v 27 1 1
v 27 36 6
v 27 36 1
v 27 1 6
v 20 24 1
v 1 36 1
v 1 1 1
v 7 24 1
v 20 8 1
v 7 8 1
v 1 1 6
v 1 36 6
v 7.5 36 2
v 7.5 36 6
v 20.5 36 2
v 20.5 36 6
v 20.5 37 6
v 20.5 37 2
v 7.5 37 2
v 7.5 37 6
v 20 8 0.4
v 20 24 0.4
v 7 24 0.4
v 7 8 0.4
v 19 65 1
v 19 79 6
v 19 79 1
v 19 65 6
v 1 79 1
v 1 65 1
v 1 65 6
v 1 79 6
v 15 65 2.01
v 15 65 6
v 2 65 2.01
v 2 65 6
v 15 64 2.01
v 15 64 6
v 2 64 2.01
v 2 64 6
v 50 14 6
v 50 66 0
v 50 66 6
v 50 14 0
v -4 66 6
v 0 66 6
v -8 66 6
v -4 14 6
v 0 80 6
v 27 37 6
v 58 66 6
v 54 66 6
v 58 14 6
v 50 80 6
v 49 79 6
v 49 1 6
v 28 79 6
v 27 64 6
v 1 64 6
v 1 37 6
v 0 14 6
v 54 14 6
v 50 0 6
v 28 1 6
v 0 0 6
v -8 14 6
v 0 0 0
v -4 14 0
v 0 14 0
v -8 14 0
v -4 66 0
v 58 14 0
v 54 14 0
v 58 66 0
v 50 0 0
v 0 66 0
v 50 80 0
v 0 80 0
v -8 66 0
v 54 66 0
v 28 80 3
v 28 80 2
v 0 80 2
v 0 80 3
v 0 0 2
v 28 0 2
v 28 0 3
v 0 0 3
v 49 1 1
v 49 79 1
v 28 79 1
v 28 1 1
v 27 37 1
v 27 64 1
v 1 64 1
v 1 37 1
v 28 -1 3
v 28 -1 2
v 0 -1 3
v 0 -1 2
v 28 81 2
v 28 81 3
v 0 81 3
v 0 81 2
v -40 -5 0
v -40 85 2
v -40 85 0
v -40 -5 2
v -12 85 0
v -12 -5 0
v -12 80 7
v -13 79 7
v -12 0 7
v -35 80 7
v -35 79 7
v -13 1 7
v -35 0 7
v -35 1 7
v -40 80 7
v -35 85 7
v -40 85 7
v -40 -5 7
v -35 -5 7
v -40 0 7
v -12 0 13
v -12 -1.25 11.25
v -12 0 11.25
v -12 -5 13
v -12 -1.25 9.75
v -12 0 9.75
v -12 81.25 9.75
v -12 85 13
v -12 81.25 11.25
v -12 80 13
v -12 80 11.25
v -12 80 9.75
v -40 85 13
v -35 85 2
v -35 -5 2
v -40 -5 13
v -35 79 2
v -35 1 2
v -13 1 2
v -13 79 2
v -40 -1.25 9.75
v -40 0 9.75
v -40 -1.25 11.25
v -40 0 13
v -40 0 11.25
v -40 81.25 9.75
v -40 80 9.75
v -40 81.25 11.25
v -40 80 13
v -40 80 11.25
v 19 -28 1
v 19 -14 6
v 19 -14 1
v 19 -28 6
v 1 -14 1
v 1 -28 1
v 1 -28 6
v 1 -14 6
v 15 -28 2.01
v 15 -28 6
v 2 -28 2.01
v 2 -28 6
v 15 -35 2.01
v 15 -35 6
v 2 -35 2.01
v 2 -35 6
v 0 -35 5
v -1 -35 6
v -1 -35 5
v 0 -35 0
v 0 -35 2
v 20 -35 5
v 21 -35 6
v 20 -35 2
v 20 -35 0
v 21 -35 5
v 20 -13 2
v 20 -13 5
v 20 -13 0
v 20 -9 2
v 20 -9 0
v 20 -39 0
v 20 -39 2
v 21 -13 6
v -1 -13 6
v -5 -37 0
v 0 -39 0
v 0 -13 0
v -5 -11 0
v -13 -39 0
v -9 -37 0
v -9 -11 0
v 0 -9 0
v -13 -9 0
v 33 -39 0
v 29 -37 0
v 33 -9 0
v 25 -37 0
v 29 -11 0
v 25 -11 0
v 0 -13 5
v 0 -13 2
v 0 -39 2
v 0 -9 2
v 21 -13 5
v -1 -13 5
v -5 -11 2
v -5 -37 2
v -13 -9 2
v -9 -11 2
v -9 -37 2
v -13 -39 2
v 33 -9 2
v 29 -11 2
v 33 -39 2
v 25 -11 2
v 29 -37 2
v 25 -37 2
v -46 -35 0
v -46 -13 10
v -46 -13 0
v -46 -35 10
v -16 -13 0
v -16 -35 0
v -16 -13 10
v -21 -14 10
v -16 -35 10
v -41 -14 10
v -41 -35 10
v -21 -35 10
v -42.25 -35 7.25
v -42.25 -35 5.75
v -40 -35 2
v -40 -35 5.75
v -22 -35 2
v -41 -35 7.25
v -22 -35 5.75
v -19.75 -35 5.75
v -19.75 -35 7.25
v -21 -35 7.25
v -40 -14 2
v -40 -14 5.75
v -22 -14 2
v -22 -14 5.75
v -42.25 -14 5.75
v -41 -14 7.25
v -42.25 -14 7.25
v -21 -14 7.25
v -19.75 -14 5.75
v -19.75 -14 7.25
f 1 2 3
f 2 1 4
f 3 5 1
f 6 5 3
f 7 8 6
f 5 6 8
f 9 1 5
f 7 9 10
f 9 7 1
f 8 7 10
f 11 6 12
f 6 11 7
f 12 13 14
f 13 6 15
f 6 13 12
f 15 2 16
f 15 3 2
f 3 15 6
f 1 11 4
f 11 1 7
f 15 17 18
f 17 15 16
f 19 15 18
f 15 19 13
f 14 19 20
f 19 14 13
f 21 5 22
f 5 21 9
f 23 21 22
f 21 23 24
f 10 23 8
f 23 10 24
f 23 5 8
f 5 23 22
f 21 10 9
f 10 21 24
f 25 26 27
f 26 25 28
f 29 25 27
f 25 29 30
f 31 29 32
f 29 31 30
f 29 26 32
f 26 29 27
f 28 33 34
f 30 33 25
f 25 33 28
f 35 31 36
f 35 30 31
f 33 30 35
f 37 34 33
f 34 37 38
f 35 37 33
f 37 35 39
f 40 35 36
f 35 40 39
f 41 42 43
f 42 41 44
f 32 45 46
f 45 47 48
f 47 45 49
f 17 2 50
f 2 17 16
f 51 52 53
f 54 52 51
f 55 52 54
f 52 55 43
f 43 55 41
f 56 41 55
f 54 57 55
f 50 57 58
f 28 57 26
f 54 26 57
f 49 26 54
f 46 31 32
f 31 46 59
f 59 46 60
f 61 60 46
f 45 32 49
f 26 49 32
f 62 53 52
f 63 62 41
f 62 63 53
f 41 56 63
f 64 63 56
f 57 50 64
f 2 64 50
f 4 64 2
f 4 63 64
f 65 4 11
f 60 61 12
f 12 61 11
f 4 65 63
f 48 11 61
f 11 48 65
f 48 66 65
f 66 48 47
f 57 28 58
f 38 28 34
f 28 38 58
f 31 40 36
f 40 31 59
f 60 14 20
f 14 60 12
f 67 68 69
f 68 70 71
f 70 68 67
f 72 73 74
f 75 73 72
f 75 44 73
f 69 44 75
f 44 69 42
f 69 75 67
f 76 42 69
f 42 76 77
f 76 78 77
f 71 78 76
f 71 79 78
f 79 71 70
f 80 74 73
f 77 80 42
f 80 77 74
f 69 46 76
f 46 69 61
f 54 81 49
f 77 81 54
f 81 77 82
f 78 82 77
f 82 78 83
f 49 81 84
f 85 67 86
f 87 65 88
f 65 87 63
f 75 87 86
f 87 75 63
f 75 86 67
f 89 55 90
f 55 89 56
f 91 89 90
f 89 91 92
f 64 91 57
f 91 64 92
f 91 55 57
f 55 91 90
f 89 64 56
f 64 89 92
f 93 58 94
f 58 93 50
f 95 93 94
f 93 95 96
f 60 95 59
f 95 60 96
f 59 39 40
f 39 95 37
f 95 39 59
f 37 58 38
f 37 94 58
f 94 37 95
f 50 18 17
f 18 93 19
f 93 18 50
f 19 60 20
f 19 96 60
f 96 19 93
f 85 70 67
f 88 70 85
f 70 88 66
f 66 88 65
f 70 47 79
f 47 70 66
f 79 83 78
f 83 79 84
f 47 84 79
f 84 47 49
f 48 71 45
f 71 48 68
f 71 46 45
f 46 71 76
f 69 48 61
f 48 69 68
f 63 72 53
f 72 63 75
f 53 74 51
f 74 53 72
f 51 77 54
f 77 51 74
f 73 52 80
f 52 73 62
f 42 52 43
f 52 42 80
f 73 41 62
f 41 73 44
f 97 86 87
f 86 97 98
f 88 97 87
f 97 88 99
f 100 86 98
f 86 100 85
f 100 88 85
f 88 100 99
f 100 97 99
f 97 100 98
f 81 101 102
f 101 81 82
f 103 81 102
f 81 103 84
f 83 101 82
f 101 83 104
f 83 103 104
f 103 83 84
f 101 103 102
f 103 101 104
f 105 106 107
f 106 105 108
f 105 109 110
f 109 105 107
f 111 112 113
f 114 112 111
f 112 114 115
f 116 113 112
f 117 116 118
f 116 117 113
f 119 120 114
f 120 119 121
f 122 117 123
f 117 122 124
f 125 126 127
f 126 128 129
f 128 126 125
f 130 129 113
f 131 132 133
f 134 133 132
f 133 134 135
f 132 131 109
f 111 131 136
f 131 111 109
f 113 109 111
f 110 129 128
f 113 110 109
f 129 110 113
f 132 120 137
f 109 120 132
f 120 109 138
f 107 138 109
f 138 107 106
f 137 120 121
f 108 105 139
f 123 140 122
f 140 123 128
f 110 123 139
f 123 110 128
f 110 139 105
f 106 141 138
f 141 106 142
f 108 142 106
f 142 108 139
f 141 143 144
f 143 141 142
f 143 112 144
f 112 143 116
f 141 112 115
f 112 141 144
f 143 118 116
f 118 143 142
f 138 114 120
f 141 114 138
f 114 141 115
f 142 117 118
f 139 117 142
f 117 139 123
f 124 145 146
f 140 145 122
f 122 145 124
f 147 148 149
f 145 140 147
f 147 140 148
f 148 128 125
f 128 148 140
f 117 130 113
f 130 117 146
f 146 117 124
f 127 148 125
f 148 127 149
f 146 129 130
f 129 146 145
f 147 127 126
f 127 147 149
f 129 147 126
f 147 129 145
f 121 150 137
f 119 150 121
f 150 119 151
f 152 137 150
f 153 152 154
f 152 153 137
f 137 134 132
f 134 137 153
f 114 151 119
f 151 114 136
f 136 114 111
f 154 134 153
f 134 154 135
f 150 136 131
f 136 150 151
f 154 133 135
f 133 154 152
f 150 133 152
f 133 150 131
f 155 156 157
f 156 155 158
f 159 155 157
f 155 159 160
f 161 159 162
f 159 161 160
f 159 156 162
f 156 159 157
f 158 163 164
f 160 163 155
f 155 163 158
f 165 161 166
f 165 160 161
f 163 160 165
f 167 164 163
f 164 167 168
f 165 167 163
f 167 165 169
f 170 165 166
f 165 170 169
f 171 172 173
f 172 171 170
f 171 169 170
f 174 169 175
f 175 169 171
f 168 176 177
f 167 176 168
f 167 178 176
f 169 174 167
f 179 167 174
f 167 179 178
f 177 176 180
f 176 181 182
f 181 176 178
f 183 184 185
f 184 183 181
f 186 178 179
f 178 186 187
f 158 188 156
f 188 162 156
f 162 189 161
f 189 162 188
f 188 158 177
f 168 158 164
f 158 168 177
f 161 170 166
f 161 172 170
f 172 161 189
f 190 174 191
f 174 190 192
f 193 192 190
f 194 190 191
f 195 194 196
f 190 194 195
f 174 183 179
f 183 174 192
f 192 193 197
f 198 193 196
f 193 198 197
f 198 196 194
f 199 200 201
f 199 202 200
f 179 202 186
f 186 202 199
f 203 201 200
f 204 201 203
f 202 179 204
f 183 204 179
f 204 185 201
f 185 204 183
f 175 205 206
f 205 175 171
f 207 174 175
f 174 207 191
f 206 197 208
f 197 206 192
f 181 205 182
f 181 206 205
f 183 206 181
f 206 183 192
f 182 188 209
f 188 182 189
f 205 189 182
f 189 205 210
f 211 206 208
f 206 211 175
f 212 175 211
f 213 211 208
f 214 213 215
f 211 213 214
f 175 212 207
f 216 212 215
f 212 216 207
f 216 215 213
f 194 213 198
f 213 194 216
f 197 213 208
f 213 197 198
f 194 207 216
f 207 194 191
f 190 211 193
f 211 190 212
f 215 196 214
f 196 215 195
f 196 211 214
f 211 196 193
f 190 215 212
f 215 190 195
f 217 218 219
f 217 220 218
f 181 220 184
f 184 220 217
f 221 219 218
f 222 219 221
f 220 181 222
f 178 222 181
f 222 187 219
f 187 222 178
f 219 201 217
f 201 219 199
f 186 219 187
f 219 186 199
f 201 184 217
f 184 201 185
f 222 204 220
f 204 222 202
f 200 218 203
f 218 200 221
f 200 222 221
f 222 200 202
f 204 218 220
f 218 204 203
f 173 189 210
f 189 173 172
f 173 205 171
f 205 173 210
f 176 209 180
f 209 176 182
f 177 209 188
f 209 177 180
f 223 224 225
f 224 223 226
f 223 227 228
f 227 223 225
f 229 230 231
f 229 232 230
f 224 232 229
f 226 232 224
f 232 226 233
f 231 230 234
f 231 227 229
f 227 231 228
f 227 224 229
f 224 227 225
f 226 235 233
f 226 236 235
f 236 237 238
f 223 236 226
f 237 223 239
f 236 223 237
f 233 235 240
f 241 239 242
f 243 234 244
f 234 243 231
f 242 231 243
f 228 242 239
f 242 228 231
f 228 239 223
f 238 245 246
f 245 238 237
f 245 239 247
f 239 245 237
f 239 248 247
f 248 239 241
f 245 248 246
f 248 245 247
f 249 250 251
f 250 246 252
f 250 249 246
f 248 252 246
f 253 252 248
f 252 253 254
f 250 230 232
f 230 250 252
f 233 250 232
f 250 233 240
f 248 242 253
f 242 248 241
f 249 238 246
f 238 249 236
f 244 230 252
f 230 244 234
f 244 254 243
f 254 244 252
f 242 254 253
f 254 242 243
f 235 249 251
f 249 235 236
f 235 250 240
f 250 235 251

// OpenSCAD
//lamystere's lazy slime cases
//insert some meaningless license here
//lamystere.com

//settings for printing/customizing
show_base = true;
//settings for printing/customizing
show_cover = true;
//settings for printing/customizing
show_satellite = true;
//settings for printing/customizing
show_satellite_cover = true;
//settings for printing
position_covers_for_printing = true;
//settings for customizing (not printing)
show_covers_transparent = true;


//settings for the bottom plate
ridge_height = 5;
//settings for the bottom plate
ridge_thickness = 1;
//settings for the bottom plate
bottom_thickness = 1;  //also controls top thickness
//measurements for the strap loops
strap_hole_length = 52;
//measurements for the strap loops
strap_hole_width = 4;
//measurements for the strap loops
satellite_strap_hole_length = 26;  //maybe 27?
//generic 18650 battery holder measurements
battery_length = 78;
//generic 18650 battery holder measurements
battery_width = 21;
//generic 18650 battery holder measurements
battery_height = 21;
//d1 mini board measurements
d1_width = 26;
//d1 mini board measurements
d1_length = 35;
//d1 mini board measurements
d1_height = 8;
//d1 mini board measurements
d1_shield_height = .6;
//d1 mini board measurements
d1_shield_width = 13;
//d1 mini board measurements
d1_shield_length = 16;
//d1 mini board measurements
d1_shield_offset_width = 6;
//d1 mini board measurements
d1_shield_offset_length = 7;
//bmi160 gyro board measurements
bmi160_width = 18;
//bmi160 gyro board measurements
bmi160_length = 14;
//bmi160 gyro board measurements
bmi160_height = 5; //4
//bmi160 gyro board 
bmi160_use_straight_pins = true; //
main_width = d1_width + battery_width + ridge_thickness * 3;
main_length = battery_length + ridge_thickness * 2;
//the 4 pin connector on the bmi160
connector_width = 13;
//the 4 pin connector on the bmi160
connector_height = 9;
//the 4 pin connector on the bmi160
connector_depth = 7;
//the 4 pin connector on the bmi160
connector_offset_z = 1;
//the 4 pin connector on the bmi160
connector_offset_y = 1;
//the 4 pin connector pushes the board up
solder_height = 2; 
//cant make lid slides an exact match, the outer channel must be a hair bigger
slide_tolerance = .5; 
//how thick the grooved sides of the covers are
slide_thickness = 5; //below 4 is too flimsy
//how thick the rail and groove are
slide_rail_thickness = 1;
//the hole at the side where the wire to the satellite runs
cable_run_width = 5; 


if (show_base) {base();}
if (show_cover) {
    if (position_covers_for_printing) {
        translate([-strap_hole_width*3,0,bottom_thickness*2 + connector_height + solder_height]) rotate([0,180,0])  cover(); 
    } else {
        if (show_covers_transparent) {
            #cover(); 
        } else {
            cover(); 
        }
    }
}

translate([0,-satellite_strap_hole_length-strap_hole_width-slide_thickness,0]) {
    if (show_satellite) {
        satellite();
    }
    if (show_satellite_cover) {
        if (position_covers_for_printing) {
            translate([-strap_hole_width*4-slide_thickness,0,bottom_thickness + connector_height + solder_height]) rotate([0,180,0])  satellite_cover();
        } else {
           if (show_covers_transparent) {
               #satellite_cover(); 
           } else {
               satellite_cover(); 
           }
        } 
    }
}

module base() {
    difference() {
        translate([0,0,0]) cube([main_width,main_length,bottom_thickness + ridge_height]);

        translate([ridge_thickness,ridge_thickness,bottom_thickness]) d1();
        translate([ridge_thickness  + d1_width,0,bottom_thickness])battery();
            
        translate([ridge_thickness,main_length -ridge_thickness - bmi160_length,bottom_thickness]) scale([1,1,1.01]) bmi160();
            
        color("purple") translate([ridge_thickness,d1_length +ridge_thickness*2,bottom_thickness]) middle_compartment();
            
        
    }
    translate([0,-slide_rail_thickness,bottom_thickness*2]) slide_ridge(d1_width+ridge_thickness*2);
    translate([0,main_length,bottom_thickness*2])  slide_ridge(d1_width+ridge_thickness*2);

    strap();
    translate([main_width,0,0]) mirror([1,0,0]) strap();
}


module slide_ridge(width) {
    color("magenta") cube([width,slide_rail_thickness,slide_rail_thickness]);
    //translate([0,-ridge_thickness+slide_tolerance,0]) cube([d1_width+ridge_thickness*2,ridge_thickness-slide_tolerance,ridge_thickness-slide_tolerance]);
}

module middle_compartment() {
    cube([main_width - battery_width - ridge_thickness * 3, main_length - d1_length - bmi160_length - ridge_thickness * 4,ridge_height*2]);
}

module battery() {
        color("blue") translate([ridge_thickness,ridge_thickness,0]) cube([battery_width,battery_length,battery_height]);
}

module d1() {
    color("red")  cube([d1_width,d1_length,d1_height]);
    
    //connector
        translate([ connector_width/2,d1_length,connector_offset_z]) cube([connector_width,connector_depth,connector_height]);

    //wifi shield
        translate([ d1_shield_offset_width,d1_shield_offset_length,-d1_shield_height]) cube([d1_shield_width,d1_shield_length,d1_shield_height]);
}

module bmi160() {
    color("green")  cube([bmi160_width,bmi160_length,bmi160_height]);
    
    //connector
    translate([connector_offset_y,-connector_depth,connector_offset_z]) cube([connector_width,connector_depth,connector_height]);
}

module strap() {
    difference() {
    color("orange") linear_extrude(bottom_thickness + ridge_height) polygon([[0,0],[0,main_length],[-strap_hole_width * 2, main_length - ((main_length - strap_hole_length) / 2)], [-strap_hole_width * 2, (main_length - strap_hole_length) / 2],[0,0]]);
        
    translate([-strap_hole_width,(main_length - strap_hole_length) / 2,  -2]) cube([strap_hole_width,strap_hole_length,ridge_height * 2]);
    }
}


module cover() {
    color("cyan") {
        difference() {
            translate([0,-slide_thickness,ridge_height+bottom_thickness]) cube([d1_width+ridge_thickness*2,main_length+slide_thickness*2,bottom_thickness + connector_height + solder_height - ridge_height]);
        
        //inner volume
            translate([ridge_thickness,ridge_thickness,ridge_height+bottom_thickness])   cube([d1_width + ridge_thickness, main_length - ridge_thickness * 2,connector_height + solder_height - ridge_height - bottom_thickness]);
            
        //cable run
        translate([d1_width - cable_run_width/2 - ridge_thickness/2,-ridge_thickness*6,ridge_height+bottom_thickness]) cube([cable_run_width,main_length*1.2,connector_height - ridge_height + 1]);
        }
        
        //middle support
        //translate([d1_width*7/8+ridge_thickness*2,d1_length+ridge_thickness*2,ridge_height]) cube([d1_width/8,ridge_thickness,d1_height - ridge_height]);
    
        side_lock();
        translate([0,main_length,0]) mirror([0,1,0]) side_lock();
    }
}

module side_lock() {
    difference() {
        translate([0,-slide_thickness,0]) cube([d1_width+ridge_thickness*2,slide_thickness,ridge_height+bottom_thickness]);
        
        translate([0,-slide_rail_thickness-slide_tolerance/2,bottom_thickness*2-slide_tolerance/2]) cube([d1_width+ridge_thickness*2,slide_rail_thickness+slide_tolerance,slide_rail_thickness+slide_tolerance]);
    }
}

module satellite() {
    difference() {
        
        cube([bmi160_width + ridge_thickness * 2,bmi160_length + connector_depth + ridge_thickness,bmi160_height + bottom_thickness ]);
            
        //bottom cutout
        translate([ridge_thickness,connector_depth,bottom_thickness]) scale([1,1,1.01]) bmi160();
        
    }
    
    //ridge 1
    translate([0,0,bmi160_height+bottom_thickness-slide_rail_thickness]) rotate([0,0,90]) slide_ridge(bmi160_length + connector_depth + ridge_thickness);
    
    //ridge 2
    translate([bmi160_width+ridge_thickness *2+slide_rail_thickness,0,bmi160_height+bottom_thickness-slide_rail_thickness]) rotate([0,0,90]) slide_ridge(bmi160_length + connector_depth + ridge_thickness);
    
    //straps
    satellite_strap();
    translate([bmi160_width+ridge_thickness*2 ,bmi160_length + connector_depth + ridge_thickness,0]) 
    rotate([0,0,180]) satellite_strap();
}

module satellite_strap() {
    translate([0,(bmi160_length + connector_depth + ridge_thickness - satellite_strap_hole_length - strap_hole_width)/2  ,0]) {
        // 
    difference() {
        translate([-slide_thickness-strap_hole_width*2,0,0]) cube([strap_hole_width*2+slide_thickness,satellite_strap_hole_length + strap_hole_width,bottom_thickness + connector_offset_z]);
        
        translate([-strap_hole_width-slide_thickness,strap_hole_width/2,0]) cube([strap_hole_width,satellite_strap_hole_length,bmi160_height]);
    }
    }
}

module satellite_cover() {
    color("lime") {
        difference() {
            translate([-slide_thickness,0,bottom_thickness + connector_offset_z]) cube([ridge_thickness*2+bmi160_width+slide_thickness*2, bmi160_length + connector_depth+ridge_thickness, connector_height + solder_height - bottom_thickness]);
            
            //inner volume
                translate([ridge_thickness,0,bottom_thickness+connector_offset_z]) cube([bmi160_width, bmi160_length + connector_depth, connector_height + solder_height - connector_offset_z - bottom_thickness * 2 ]);
            
            //bottom volume
            translate([0,0,0]) cube([bmi160_width + ridge_thickness*2, bmi160_length + connector_depth, bmi160_height + bottom_thickness + slide_tolerance/2]);
            
            //side channel 1
            translate([-slide_rail_thickness-slide_tolerance/2,0,bmi160_height+bottom_thickness-slide_rail_thickness-slide_tolerance/2]) cube([slide_rail_thickness+slide_tolerance,bmi160_length + connector_depth,slide_rail_thickness+slide_tolerance]);
            
            //side channel 2
            translate([bmi160_width+ridge_thickness+slide_rail_thickness-slide_tolerance/2,0,bmi160_height+bottom_thickness-slide_rail_thickness-slide_tolerance/2]) cube([slide_rail_thickness+slide_tolerance,bmi160_length + connector_depth,slide_rail_thickness+slide_tolerance]);
            

        }
        
    }
}
